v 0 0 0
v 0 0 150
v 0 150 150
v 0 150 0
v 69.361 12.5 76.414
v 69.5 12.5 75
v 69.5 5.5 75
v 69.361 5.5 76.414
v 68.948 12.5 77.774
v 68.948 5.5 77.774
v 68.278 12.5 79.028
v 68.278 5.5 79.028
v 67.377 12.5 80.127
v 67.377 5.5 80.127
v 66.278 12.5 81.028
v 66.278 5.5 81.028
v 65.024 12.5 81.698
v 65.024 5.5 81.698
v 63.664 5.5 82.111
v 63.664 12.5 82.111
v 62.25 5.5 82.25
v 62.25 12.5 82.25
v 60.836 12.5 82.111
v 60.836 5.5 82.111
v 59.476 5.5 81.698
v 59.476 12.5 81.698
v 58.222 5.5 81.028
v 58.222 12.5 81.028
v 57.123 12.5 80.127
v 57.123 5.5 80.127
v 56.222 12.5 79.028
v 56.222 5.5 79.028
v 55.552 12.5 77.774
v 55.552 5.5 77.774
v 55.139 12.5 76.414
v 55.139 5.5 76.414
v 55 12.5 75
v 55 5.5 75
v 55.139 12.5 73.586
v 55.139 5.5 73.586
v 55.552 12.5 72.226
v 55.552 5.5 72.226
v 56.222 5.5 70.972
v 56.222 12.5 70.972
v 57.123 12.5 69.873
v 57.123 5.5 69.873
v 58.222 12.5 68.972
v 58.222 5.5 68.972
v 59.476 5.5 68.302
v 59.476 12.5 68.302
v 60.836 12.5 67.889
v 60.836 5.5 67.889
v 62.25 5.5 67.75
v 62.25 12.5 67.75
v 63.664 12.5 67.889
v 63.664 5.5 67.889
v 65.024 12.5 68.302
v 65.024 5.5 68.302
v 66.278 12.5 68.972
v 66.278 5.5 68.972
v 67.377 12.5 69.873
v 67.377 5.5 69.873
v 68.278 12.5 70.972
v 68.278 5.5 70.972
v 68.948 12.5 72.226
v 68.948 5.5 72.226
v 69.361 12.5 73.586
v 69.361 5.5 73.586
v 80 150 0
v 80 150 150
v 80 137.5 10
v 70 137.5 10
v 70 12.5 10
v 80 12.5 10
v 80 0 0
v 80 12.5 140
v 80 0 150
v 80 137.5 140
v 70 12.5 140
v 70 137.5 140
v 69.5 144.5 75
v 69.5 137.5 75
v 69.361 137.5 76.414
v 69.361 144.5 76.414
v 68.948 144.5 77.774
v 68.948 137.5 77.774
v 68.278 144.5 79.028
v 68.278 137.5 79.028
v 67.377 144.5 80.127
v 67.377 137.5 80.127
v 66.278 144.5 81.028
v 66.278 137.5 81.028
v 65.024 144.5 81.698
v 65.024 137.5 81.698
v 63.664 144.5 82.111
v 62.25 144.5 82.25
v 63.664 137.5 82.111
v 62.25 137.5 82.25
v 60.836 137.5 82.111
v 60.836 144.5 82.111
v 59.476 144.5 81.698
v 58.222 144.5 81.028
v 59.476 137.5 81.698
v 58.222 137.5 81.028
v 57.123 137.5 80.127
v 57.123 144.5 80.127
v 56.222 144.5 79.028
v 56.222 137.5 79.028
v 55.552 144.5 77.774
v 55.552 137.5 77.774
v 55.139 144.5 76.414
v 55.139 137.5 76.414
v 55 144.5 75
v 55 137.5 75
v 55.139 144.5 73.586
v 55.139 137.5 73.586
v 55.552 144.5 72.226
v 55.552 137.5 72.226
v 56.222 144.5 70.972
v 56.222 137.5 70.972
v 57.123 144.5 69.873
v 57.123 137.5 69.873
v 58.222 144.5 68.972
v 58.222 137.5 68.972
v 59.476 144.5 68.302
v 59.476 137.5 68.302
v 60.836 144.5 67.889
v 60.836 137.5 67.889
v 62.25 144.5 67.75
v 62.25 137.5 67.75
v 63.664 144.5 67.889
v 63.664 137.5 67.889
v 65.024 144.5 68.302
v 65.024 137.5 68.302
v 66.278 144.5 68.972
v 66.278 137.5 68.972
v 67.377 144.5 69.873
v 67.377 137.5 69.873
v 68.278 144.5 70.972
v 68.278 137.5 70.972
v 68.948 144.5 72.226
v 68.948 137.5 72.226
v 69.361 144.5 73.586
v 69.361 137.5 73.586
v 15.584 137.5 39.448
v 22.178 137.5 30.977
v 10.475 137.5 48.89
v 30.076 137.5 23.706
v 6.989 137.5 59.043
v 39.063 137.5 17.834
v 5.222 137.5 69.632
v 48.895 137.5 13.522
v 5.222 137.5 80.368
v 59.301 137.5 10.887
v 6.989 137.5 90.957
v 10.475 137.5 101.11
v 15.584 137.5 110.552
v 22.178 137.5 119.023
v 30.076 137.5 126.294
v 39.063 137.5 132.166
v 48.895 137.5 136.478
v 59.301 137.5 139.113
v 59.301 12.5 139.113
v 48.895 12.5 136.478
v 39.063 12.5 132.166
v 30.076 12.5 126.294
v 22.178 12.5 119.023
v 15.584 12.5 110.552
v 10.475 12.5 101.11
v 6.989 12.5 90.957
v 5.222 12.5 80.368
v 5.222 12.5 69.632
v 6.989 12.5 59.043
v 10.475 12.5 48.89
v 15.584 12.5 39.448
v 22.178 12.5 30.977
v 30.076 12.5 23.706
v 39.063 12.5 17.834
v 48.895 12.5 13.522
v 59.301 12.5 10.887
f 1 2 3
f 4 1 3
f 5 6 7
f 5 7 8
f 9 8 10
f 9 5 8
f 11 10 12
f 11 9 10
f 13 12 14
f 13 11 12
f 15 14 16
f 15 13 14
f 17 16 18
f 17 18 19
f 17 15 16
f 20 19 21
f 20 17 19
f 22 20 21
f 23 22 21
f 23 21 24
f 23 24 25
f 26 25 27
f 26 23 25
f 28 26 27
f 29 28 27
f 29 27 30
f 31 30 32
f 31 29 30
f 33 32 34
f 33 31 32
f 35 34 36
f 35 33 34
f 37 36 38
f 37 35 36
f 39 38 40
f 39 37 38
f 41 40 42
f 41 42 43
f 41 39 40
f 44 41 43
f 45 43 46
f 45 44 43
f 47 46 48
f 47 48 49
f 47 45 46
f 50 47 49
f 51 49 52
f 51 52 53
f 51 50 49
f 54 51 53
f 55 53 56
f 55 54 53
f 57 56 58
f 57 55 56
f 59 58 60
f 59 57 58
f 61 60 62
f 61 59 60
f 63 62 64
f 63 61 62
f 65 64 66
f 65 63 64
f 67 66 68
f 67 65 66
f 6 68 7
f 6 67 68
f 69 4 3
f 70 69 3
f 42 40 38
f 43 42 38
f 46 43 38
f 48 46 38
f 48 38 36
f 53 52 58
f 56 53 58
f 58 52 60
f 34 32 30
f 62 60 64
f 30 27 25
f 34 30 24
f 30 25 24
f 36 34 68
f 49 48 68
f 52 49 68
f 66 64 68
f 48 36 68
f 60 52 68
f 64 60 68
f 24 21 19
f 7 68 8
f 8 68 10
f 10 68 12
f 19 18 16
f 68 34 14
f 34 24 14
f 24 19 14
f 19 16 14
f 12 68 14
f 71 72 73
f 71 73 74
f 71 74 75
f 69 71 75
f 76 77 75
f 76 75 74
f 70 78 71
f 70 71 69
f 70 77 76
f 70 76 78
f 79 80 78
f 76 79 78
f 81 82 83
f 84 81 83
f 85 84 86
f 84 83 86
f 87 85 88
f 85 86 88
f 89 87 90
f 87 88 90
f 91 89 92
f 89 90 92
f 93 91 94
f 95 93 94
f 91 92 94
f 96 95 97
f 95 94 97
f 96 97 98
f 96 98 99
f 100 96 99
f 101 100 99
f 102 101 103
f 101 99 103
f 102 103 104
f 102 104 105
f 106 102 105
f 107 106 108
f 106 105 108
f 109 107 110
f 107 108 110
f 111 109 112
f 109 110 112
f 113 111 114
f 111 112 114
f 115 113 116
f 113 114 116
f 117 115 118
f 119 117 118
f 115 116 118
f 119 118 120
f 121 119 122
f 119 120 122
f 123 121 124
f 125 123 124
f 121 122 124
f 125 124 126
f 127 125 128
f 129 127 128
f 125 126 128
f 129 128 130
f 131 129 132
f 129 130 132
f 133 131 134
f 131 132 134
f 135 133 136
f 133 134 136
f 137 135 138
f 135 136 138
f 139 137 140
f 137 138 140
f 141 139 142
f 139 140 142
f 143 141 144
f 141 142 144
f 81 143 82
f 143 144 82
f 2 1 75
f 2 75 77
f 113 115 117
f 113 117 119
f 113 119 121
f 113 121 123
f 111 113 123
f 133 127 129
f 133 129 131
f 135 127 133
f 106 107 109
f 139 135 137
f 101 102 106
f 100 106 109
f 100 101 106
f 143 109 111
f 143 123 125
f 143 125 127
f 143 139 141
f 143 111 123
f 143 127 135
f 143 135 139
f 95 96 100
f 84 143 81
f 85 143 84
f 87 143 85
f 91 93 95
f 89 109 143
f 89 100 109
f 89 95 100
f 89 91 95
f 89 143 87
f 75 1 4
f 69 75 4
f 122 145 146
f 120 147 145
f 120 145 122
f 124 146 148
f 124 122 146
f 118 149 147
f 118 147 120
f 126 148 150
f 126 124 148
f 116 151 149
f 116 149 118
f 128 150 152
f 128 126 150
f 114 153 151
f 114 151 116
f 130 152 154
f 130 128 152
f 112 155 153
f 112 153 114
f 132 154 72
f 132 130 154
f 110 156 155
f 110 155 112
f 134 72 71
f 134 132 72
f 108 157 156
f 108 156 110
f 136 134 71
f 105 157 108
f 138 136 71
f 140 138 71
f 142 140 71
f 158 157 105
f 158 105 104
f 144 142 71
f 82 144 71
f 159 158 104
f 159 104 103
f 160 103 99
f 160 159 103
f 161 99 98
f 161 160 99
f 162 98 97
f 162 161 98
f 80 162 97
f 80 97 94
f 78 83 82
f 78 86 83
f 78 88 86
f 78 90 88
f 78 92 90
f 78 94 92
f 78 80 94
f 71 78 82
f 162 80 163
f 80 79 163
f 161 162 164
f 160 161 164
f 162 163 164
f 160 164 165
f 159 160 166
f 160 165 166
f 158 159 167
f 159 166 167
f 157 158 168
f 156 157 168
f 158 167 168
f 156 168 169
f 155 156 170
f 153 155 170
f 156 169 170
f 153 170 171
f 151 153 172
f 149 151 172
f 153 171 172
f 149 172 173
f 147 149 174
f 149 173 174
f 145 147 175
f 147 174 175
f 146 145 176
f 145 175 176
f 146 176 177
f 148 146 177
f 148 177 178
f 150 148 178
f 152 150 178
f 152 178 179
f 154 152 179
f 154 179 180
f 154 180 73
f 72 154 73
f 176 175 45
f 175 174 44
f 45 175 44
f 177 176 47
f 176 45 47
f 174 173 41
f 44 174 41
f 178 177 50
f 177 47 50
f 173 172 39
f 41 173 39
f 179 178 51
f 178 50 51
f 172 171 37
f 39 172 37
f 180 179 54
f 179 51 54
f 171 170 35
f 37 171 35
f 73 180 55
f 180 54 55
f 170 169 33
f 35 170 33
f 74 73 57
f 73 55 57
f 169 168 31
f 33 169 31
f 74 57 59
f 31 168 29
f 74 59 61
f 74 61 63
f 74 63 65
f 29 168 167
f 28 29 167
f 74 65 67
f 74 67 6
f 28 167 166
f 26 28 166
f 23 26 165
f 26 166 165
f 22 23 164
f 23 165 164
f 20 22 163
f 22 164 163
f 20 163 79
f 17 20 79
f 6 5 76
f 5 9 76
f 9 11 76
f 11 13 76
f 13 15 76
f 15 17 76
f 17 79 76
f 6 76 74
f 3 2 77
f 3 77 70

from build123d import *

# Parameters (mm, degrees)
F0_W          = 150
F0_H          = 150
F1_DEPTH      = 80
F3_W          = 10
F3_H          = 130
F4_DEPTH      = 62.5
F4_DEPTH_BACK = 62.5
F5_R          = 7.25
F6_DEPTH      = 7


with BuildPart() as f1:
    # F0 (on Right) → F1 (new body)
    with BuildSketch(Plane.YZ):
        with Locations((75, 75)):
            Rectangle(F0_W, F0_H)
    extrude(amount=F1_DEPTH)

    # F3 (on mid) → F4 (cut, two sides)
    with BuildSketch(Plane.XZ.offset(-75)) as f4_sk:
        with Locations((75, 75)):
            Rectangle(F3_W, F3_H)
        with BuildLine():
            Line((70, 10), (70, 140))
            ThreePointArc((70, 140), (5, 75), (70, 10))
        make_face()
    extrude(amount=-F4_DEPTH, mode=Mode.SUBTRACT)
    extrude(f4_sk.sketch, amount=F4_DEPTH_BACK, mode=Mode.SUBTRACT)

    # F5 (on face) → F6 (cut)
    with BuildSketch(Plane.XZ.offset(-137.5)):
        with Locations((62.25, 75)):
            Circle(F5_R)
    extrude(amount=-F6_DEPTH, mode=Mode.SUBTRACT)

    # F7: F1 across plane


with BuildPart() as f1_1:
    add(f1.part)
    add(f1.part.mirror(Plane(origin=(40, 75, 75), x_dir=(1, 0, 0), z_dir=(0, -1, 0))), mode=Mode.INTERSECT)


solid = f1_1.part
